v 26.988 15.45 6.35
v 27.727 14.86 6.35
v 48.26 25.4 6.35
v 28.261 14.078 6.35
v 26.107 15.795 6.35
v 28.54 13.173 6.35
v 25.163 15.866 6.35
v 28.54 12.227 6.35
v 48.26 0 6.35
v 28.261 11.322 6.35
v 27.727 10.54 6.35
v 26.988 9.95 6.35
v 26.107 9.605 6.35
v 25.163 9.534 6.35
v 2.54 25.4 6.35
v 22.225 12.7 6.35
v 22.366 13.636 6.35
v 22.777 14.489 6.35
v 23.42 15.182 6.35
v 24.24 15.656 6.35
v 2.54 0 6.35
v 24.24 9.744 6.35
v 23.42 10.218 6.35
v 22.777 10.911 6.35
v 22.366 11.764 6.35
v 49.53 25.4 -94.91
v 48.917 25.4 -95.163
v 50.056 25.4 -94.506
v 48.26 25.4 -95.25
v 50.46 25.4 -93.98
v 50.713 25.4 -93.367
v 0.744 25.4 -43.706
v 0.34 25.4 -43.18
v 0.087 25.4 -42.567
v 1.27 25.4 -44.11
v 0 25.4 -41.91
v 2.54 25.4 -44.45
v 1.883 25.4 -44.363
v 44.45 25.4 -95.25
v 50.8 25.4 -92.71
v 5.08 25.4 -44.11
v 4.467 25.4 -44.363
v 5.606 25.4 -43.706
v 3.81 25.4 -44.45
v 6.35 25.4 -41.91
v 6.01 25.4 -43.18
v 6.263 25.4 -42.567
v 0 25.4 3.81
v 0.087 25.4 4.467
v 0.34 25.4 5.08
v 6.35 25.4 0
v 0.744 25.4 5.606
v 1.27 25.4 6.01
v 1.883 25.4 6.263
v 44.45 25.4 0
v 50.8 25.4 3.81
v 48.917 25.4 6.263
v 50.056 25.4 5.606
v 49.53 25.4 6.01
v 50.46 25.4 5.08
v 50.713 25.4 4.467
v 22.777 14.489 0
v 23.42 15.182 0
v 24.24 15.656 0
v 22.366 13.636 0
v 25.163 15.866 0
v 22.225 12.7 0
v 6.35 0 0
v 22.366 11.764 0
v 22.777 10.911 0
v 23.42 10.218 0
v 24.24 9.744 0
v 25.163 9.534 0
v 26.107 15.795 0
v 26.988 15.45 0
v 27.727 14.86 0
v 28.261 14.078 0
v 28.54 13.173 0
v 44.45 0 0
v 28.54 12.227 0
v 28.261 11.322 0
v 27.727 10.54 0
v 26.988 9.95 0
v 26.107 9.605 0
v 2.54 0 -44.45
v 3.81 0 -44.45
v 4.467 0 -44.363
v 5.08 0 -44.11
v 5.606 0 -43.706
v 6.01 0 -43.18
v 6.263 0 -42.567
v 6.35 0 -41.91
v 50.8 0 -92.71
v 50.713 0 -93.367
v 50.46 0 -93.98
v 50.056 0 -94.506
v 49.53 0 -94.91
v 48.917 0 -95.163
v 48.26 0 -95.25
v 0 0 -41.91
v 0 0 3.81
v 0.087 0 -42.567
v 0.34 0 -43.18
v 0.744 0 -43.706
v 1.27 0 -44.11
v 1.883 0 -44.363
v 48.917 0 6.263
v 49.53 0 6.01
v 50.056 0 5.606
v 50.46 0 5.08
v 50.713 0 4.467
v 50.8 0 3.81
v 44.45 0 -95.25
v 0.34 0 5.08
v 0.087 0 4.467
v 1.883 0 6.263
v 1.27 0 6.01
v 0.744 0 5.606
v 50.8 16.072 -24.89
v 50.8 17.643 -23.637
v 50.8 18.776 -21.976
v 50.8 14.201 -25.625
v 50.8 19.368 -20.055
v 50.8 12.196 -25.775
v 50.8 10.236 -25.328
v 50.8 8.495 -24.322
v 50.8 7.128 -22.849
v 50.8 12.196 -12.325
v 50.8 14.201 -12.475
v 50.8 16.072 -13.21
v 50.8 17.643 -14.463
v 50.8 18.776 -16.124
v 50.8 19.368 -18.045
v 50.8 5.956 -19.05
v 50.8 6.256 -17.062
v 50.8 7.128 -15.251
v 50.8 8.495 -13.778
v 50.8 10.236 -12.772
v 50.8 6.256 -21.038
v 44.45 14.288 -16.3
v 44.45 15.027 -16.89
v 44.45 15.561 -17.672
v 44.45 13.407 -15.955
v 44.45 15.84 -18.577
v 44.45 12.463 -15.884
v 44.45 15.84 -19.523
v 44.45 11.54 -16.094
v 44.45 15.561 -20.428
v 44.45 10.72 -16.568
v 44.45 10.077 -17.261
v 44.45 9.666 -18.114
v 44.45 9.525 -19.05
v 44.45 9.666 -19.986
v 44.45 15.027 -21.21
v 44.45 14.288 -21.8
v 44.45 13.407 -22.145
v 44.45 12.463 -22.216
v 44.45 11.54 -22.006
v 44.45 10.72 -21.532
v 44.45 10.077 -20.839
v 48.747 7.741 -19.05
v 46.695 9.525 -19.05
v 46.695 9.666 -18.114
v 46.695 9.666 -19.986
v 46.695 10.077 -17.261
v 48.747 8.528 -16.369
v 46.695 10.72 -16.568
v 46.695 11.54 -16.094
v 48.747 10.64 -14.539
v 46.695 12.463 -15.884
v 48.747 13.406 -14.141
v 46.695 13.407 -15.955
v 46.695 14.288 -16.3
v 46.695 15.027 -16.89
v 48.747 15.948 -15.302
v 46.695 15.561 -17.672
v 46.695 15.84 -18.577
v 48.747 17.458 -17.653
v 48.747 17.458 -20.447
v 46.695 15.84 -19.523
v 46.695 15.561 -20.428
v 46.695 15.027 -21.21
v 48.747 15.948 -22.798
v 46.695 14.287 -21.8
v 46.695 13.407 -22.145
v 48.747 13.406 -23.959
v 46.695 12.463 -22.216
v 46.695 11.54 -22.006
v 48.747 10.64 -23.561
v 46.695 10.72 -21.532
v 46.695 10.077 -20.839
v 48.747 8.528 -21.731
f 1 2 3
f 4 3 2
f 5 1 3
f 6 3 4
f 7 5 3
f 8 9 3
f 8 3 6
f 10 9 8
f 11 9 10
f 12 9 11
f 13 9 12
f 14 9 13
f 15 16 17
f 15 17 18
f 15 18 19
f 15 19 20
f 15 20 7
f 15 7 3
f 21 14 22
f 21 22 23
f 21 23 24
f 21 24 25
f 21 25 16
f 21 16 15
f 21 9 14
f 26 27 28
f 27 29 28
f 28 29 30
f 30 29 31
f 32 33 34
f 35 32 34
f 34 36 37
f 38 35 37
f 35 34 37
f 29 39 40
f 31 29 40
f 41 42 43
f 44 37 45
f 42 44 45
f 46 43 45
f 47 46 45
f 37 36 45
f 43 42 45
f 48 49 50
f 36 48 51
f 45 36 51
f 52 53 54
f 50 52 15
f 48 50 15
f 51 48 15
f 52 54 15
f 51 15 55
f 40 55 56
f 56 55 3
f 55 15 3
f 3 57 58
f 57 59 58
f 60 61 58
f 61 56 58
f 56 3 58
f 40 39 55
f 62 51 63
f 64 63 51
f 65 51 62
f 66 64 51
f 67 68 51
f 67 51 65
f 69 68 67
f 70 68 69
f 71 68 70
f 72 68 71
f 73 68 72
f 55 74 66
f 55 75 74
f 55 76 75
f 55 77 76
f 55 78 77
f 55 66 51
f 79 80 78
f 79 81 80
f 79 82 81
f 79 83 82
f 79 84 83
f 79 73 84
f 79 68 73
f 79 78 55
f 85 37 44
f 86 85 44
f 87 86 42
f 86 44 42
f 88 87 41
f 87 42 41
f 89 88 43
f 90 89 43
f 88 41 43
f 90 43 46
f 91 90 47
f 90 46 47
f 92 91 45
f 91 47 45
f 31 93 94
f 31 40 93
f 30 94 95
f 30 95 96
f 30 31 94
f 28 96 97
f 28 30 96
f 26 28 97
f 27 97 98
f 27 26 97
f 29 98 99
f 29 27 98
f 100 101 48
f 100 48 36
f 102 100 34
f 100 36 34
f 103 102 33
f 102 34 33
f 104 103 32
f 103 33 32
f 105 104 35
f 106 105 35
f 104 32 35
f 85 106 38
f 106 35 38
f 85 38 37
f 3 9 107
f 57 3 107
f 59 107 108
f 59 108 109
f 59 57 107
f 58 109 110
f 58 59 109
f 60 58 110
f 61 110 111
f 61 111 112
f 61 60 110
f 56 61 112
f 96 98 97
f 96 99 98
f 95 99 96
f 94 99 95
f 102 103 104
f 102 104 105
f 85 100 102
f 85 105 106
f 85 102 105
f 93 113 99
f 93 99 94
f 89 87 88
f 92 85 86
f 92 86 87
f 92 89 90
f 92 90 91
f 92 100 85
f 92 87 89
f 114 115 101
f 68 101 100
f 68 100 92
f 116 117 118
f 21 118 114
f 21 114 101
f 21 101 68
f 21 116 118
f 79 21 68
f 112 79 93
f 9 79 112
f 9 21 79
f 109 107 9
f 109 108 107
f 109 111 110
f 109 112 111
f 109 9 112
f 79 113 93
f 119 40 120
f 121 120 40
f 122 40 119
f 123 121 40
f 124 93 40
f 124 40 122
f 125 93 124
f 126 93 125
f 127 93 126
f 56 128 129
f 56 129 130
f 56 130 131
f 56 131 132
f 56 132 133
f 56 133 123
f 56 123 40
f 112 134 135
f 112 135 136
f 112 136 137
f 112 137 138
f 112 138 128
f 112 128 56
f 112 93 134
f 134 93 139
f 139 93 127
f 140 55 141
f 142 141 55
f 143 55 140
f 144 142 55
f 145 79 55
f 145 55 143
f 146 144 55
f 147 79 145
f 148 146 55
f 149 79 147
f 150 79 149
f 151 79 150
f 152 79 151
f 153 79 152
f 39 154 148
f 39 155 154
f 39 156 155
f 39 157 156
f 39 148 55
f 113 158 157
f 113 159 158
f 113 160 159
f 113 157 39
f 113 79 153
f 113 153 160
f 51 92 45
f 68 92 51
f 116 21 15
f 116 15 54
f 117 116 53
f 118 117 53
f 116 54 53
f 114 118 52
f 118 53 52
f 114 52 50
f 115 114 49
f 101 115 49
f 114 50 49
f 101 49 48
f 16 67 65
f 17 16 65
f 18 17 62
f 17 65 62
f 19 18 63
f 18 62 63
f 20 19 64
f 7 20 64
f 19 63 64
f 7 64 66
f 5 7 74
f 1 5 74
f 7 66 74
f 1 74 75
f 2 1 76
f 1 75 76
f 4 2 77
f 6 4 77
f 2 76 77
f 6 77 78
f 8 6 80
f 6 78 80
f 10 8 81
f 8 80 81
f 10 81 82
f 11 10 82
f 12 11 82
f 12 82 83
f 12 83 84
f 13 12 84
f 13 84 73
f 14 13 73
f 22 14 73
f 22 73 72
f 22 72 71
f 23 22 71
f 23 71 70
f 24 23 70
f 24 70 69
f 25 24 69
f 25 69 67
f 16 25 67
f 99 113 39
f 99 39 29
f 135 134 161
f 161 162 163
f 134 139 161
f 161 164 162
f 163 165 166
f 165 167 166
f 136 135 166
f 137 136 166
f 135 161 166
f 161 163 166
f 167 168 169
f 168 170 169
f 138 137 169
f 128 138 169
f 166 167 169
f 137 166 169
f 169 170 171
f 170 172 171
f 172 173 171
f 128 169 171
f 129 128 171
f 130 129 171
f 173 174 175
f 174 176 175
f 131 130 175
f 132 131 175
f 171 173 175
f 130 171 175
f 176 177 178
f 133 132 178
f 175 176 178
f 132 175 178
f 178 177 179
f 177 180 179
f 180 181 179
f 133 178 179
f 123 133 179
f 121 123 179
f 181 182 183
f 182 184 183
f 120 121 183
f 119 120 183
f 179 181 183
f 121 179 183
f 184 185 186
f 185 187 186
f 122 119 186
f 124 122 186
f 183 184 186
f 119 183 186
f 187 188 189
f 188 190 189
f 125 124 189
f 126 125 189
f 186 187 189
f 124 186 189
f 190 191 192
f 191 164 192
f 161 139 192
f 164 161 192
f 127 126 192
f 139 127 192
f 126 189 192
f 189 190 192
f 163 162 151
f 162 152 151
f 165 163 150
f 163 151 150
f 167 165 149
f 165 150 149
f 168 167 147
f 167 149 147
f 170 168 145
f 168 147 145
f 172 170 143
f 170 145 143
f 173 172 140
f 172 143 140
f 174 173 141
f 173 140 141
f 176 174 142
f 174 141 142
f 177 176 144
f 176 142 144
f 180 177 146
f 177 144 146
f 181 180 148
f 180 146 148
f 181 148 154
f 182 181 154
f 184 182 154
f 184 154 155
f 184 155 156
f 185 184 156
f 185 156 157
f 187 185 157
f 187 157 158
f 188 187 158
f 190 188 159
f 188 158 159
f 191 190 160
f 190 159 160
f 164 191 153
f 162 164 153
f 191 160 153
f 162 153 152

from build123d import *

# Parameters (mm, degrees)
F1_DEPTH       = 25.4
F4_D           = 6.35
F4_DEPTH       = 12.7
F4_CSINK_D     = 13.4874
F4_CSINK_ANGLE = 82
F5_D           = 6.35
F5_DEPTH       = 12.7
F6_R           = 2.54
F7_R           = 2.54


with BuildPart() as f1:
    # F0 (on Front) → F1 (new body)
    with BuildSketch(Plane.XZ):
        Polygon((50.8, 6.35), (0, 6.35), (0, -44.45), (6.35, -44.45), (6.35, 0), (44.45, 0), (44.45, -95.25), (50.8, -95.25), align=None)
    extrude(amount=-F1_DEPTH)

    # F4
    with Locations(Plane.YZ.offset(50.8)):
        with Locations((12.7, -19.05)):
            CounterSinkHole(F4_D / 2, F4_CSINK_D / 2, depth=F4_DEPTH, counter_sink_angle=F4_CSINK_ANGLE)

    # F5
    with Locations(Plane.XY.offset(6.35)):
        with Locations((25.4, 12.7)):
            Hole(F5_D / 2, depth=F5_DEPTH)

    # F6
    f6_edges = [f1.edges().sort_by_distance(p)[0] for p in [
        (0, 12.7, 6.35),
        (50.8, 12.7, 6.35),
    ]]
    fillet(f6_edges, radius=F6_R)

    # F7
    f7_edges = [f1.edges().sort_by_distance(p)[0] for p in [
        (50.8, 12.7, -95.25),
        (6.35, 12.7, -44.45),
        (0, 12.7, -44.45),
    ]]
    fillet(f7_edges, radius=F7_R)


solid = f1.part
